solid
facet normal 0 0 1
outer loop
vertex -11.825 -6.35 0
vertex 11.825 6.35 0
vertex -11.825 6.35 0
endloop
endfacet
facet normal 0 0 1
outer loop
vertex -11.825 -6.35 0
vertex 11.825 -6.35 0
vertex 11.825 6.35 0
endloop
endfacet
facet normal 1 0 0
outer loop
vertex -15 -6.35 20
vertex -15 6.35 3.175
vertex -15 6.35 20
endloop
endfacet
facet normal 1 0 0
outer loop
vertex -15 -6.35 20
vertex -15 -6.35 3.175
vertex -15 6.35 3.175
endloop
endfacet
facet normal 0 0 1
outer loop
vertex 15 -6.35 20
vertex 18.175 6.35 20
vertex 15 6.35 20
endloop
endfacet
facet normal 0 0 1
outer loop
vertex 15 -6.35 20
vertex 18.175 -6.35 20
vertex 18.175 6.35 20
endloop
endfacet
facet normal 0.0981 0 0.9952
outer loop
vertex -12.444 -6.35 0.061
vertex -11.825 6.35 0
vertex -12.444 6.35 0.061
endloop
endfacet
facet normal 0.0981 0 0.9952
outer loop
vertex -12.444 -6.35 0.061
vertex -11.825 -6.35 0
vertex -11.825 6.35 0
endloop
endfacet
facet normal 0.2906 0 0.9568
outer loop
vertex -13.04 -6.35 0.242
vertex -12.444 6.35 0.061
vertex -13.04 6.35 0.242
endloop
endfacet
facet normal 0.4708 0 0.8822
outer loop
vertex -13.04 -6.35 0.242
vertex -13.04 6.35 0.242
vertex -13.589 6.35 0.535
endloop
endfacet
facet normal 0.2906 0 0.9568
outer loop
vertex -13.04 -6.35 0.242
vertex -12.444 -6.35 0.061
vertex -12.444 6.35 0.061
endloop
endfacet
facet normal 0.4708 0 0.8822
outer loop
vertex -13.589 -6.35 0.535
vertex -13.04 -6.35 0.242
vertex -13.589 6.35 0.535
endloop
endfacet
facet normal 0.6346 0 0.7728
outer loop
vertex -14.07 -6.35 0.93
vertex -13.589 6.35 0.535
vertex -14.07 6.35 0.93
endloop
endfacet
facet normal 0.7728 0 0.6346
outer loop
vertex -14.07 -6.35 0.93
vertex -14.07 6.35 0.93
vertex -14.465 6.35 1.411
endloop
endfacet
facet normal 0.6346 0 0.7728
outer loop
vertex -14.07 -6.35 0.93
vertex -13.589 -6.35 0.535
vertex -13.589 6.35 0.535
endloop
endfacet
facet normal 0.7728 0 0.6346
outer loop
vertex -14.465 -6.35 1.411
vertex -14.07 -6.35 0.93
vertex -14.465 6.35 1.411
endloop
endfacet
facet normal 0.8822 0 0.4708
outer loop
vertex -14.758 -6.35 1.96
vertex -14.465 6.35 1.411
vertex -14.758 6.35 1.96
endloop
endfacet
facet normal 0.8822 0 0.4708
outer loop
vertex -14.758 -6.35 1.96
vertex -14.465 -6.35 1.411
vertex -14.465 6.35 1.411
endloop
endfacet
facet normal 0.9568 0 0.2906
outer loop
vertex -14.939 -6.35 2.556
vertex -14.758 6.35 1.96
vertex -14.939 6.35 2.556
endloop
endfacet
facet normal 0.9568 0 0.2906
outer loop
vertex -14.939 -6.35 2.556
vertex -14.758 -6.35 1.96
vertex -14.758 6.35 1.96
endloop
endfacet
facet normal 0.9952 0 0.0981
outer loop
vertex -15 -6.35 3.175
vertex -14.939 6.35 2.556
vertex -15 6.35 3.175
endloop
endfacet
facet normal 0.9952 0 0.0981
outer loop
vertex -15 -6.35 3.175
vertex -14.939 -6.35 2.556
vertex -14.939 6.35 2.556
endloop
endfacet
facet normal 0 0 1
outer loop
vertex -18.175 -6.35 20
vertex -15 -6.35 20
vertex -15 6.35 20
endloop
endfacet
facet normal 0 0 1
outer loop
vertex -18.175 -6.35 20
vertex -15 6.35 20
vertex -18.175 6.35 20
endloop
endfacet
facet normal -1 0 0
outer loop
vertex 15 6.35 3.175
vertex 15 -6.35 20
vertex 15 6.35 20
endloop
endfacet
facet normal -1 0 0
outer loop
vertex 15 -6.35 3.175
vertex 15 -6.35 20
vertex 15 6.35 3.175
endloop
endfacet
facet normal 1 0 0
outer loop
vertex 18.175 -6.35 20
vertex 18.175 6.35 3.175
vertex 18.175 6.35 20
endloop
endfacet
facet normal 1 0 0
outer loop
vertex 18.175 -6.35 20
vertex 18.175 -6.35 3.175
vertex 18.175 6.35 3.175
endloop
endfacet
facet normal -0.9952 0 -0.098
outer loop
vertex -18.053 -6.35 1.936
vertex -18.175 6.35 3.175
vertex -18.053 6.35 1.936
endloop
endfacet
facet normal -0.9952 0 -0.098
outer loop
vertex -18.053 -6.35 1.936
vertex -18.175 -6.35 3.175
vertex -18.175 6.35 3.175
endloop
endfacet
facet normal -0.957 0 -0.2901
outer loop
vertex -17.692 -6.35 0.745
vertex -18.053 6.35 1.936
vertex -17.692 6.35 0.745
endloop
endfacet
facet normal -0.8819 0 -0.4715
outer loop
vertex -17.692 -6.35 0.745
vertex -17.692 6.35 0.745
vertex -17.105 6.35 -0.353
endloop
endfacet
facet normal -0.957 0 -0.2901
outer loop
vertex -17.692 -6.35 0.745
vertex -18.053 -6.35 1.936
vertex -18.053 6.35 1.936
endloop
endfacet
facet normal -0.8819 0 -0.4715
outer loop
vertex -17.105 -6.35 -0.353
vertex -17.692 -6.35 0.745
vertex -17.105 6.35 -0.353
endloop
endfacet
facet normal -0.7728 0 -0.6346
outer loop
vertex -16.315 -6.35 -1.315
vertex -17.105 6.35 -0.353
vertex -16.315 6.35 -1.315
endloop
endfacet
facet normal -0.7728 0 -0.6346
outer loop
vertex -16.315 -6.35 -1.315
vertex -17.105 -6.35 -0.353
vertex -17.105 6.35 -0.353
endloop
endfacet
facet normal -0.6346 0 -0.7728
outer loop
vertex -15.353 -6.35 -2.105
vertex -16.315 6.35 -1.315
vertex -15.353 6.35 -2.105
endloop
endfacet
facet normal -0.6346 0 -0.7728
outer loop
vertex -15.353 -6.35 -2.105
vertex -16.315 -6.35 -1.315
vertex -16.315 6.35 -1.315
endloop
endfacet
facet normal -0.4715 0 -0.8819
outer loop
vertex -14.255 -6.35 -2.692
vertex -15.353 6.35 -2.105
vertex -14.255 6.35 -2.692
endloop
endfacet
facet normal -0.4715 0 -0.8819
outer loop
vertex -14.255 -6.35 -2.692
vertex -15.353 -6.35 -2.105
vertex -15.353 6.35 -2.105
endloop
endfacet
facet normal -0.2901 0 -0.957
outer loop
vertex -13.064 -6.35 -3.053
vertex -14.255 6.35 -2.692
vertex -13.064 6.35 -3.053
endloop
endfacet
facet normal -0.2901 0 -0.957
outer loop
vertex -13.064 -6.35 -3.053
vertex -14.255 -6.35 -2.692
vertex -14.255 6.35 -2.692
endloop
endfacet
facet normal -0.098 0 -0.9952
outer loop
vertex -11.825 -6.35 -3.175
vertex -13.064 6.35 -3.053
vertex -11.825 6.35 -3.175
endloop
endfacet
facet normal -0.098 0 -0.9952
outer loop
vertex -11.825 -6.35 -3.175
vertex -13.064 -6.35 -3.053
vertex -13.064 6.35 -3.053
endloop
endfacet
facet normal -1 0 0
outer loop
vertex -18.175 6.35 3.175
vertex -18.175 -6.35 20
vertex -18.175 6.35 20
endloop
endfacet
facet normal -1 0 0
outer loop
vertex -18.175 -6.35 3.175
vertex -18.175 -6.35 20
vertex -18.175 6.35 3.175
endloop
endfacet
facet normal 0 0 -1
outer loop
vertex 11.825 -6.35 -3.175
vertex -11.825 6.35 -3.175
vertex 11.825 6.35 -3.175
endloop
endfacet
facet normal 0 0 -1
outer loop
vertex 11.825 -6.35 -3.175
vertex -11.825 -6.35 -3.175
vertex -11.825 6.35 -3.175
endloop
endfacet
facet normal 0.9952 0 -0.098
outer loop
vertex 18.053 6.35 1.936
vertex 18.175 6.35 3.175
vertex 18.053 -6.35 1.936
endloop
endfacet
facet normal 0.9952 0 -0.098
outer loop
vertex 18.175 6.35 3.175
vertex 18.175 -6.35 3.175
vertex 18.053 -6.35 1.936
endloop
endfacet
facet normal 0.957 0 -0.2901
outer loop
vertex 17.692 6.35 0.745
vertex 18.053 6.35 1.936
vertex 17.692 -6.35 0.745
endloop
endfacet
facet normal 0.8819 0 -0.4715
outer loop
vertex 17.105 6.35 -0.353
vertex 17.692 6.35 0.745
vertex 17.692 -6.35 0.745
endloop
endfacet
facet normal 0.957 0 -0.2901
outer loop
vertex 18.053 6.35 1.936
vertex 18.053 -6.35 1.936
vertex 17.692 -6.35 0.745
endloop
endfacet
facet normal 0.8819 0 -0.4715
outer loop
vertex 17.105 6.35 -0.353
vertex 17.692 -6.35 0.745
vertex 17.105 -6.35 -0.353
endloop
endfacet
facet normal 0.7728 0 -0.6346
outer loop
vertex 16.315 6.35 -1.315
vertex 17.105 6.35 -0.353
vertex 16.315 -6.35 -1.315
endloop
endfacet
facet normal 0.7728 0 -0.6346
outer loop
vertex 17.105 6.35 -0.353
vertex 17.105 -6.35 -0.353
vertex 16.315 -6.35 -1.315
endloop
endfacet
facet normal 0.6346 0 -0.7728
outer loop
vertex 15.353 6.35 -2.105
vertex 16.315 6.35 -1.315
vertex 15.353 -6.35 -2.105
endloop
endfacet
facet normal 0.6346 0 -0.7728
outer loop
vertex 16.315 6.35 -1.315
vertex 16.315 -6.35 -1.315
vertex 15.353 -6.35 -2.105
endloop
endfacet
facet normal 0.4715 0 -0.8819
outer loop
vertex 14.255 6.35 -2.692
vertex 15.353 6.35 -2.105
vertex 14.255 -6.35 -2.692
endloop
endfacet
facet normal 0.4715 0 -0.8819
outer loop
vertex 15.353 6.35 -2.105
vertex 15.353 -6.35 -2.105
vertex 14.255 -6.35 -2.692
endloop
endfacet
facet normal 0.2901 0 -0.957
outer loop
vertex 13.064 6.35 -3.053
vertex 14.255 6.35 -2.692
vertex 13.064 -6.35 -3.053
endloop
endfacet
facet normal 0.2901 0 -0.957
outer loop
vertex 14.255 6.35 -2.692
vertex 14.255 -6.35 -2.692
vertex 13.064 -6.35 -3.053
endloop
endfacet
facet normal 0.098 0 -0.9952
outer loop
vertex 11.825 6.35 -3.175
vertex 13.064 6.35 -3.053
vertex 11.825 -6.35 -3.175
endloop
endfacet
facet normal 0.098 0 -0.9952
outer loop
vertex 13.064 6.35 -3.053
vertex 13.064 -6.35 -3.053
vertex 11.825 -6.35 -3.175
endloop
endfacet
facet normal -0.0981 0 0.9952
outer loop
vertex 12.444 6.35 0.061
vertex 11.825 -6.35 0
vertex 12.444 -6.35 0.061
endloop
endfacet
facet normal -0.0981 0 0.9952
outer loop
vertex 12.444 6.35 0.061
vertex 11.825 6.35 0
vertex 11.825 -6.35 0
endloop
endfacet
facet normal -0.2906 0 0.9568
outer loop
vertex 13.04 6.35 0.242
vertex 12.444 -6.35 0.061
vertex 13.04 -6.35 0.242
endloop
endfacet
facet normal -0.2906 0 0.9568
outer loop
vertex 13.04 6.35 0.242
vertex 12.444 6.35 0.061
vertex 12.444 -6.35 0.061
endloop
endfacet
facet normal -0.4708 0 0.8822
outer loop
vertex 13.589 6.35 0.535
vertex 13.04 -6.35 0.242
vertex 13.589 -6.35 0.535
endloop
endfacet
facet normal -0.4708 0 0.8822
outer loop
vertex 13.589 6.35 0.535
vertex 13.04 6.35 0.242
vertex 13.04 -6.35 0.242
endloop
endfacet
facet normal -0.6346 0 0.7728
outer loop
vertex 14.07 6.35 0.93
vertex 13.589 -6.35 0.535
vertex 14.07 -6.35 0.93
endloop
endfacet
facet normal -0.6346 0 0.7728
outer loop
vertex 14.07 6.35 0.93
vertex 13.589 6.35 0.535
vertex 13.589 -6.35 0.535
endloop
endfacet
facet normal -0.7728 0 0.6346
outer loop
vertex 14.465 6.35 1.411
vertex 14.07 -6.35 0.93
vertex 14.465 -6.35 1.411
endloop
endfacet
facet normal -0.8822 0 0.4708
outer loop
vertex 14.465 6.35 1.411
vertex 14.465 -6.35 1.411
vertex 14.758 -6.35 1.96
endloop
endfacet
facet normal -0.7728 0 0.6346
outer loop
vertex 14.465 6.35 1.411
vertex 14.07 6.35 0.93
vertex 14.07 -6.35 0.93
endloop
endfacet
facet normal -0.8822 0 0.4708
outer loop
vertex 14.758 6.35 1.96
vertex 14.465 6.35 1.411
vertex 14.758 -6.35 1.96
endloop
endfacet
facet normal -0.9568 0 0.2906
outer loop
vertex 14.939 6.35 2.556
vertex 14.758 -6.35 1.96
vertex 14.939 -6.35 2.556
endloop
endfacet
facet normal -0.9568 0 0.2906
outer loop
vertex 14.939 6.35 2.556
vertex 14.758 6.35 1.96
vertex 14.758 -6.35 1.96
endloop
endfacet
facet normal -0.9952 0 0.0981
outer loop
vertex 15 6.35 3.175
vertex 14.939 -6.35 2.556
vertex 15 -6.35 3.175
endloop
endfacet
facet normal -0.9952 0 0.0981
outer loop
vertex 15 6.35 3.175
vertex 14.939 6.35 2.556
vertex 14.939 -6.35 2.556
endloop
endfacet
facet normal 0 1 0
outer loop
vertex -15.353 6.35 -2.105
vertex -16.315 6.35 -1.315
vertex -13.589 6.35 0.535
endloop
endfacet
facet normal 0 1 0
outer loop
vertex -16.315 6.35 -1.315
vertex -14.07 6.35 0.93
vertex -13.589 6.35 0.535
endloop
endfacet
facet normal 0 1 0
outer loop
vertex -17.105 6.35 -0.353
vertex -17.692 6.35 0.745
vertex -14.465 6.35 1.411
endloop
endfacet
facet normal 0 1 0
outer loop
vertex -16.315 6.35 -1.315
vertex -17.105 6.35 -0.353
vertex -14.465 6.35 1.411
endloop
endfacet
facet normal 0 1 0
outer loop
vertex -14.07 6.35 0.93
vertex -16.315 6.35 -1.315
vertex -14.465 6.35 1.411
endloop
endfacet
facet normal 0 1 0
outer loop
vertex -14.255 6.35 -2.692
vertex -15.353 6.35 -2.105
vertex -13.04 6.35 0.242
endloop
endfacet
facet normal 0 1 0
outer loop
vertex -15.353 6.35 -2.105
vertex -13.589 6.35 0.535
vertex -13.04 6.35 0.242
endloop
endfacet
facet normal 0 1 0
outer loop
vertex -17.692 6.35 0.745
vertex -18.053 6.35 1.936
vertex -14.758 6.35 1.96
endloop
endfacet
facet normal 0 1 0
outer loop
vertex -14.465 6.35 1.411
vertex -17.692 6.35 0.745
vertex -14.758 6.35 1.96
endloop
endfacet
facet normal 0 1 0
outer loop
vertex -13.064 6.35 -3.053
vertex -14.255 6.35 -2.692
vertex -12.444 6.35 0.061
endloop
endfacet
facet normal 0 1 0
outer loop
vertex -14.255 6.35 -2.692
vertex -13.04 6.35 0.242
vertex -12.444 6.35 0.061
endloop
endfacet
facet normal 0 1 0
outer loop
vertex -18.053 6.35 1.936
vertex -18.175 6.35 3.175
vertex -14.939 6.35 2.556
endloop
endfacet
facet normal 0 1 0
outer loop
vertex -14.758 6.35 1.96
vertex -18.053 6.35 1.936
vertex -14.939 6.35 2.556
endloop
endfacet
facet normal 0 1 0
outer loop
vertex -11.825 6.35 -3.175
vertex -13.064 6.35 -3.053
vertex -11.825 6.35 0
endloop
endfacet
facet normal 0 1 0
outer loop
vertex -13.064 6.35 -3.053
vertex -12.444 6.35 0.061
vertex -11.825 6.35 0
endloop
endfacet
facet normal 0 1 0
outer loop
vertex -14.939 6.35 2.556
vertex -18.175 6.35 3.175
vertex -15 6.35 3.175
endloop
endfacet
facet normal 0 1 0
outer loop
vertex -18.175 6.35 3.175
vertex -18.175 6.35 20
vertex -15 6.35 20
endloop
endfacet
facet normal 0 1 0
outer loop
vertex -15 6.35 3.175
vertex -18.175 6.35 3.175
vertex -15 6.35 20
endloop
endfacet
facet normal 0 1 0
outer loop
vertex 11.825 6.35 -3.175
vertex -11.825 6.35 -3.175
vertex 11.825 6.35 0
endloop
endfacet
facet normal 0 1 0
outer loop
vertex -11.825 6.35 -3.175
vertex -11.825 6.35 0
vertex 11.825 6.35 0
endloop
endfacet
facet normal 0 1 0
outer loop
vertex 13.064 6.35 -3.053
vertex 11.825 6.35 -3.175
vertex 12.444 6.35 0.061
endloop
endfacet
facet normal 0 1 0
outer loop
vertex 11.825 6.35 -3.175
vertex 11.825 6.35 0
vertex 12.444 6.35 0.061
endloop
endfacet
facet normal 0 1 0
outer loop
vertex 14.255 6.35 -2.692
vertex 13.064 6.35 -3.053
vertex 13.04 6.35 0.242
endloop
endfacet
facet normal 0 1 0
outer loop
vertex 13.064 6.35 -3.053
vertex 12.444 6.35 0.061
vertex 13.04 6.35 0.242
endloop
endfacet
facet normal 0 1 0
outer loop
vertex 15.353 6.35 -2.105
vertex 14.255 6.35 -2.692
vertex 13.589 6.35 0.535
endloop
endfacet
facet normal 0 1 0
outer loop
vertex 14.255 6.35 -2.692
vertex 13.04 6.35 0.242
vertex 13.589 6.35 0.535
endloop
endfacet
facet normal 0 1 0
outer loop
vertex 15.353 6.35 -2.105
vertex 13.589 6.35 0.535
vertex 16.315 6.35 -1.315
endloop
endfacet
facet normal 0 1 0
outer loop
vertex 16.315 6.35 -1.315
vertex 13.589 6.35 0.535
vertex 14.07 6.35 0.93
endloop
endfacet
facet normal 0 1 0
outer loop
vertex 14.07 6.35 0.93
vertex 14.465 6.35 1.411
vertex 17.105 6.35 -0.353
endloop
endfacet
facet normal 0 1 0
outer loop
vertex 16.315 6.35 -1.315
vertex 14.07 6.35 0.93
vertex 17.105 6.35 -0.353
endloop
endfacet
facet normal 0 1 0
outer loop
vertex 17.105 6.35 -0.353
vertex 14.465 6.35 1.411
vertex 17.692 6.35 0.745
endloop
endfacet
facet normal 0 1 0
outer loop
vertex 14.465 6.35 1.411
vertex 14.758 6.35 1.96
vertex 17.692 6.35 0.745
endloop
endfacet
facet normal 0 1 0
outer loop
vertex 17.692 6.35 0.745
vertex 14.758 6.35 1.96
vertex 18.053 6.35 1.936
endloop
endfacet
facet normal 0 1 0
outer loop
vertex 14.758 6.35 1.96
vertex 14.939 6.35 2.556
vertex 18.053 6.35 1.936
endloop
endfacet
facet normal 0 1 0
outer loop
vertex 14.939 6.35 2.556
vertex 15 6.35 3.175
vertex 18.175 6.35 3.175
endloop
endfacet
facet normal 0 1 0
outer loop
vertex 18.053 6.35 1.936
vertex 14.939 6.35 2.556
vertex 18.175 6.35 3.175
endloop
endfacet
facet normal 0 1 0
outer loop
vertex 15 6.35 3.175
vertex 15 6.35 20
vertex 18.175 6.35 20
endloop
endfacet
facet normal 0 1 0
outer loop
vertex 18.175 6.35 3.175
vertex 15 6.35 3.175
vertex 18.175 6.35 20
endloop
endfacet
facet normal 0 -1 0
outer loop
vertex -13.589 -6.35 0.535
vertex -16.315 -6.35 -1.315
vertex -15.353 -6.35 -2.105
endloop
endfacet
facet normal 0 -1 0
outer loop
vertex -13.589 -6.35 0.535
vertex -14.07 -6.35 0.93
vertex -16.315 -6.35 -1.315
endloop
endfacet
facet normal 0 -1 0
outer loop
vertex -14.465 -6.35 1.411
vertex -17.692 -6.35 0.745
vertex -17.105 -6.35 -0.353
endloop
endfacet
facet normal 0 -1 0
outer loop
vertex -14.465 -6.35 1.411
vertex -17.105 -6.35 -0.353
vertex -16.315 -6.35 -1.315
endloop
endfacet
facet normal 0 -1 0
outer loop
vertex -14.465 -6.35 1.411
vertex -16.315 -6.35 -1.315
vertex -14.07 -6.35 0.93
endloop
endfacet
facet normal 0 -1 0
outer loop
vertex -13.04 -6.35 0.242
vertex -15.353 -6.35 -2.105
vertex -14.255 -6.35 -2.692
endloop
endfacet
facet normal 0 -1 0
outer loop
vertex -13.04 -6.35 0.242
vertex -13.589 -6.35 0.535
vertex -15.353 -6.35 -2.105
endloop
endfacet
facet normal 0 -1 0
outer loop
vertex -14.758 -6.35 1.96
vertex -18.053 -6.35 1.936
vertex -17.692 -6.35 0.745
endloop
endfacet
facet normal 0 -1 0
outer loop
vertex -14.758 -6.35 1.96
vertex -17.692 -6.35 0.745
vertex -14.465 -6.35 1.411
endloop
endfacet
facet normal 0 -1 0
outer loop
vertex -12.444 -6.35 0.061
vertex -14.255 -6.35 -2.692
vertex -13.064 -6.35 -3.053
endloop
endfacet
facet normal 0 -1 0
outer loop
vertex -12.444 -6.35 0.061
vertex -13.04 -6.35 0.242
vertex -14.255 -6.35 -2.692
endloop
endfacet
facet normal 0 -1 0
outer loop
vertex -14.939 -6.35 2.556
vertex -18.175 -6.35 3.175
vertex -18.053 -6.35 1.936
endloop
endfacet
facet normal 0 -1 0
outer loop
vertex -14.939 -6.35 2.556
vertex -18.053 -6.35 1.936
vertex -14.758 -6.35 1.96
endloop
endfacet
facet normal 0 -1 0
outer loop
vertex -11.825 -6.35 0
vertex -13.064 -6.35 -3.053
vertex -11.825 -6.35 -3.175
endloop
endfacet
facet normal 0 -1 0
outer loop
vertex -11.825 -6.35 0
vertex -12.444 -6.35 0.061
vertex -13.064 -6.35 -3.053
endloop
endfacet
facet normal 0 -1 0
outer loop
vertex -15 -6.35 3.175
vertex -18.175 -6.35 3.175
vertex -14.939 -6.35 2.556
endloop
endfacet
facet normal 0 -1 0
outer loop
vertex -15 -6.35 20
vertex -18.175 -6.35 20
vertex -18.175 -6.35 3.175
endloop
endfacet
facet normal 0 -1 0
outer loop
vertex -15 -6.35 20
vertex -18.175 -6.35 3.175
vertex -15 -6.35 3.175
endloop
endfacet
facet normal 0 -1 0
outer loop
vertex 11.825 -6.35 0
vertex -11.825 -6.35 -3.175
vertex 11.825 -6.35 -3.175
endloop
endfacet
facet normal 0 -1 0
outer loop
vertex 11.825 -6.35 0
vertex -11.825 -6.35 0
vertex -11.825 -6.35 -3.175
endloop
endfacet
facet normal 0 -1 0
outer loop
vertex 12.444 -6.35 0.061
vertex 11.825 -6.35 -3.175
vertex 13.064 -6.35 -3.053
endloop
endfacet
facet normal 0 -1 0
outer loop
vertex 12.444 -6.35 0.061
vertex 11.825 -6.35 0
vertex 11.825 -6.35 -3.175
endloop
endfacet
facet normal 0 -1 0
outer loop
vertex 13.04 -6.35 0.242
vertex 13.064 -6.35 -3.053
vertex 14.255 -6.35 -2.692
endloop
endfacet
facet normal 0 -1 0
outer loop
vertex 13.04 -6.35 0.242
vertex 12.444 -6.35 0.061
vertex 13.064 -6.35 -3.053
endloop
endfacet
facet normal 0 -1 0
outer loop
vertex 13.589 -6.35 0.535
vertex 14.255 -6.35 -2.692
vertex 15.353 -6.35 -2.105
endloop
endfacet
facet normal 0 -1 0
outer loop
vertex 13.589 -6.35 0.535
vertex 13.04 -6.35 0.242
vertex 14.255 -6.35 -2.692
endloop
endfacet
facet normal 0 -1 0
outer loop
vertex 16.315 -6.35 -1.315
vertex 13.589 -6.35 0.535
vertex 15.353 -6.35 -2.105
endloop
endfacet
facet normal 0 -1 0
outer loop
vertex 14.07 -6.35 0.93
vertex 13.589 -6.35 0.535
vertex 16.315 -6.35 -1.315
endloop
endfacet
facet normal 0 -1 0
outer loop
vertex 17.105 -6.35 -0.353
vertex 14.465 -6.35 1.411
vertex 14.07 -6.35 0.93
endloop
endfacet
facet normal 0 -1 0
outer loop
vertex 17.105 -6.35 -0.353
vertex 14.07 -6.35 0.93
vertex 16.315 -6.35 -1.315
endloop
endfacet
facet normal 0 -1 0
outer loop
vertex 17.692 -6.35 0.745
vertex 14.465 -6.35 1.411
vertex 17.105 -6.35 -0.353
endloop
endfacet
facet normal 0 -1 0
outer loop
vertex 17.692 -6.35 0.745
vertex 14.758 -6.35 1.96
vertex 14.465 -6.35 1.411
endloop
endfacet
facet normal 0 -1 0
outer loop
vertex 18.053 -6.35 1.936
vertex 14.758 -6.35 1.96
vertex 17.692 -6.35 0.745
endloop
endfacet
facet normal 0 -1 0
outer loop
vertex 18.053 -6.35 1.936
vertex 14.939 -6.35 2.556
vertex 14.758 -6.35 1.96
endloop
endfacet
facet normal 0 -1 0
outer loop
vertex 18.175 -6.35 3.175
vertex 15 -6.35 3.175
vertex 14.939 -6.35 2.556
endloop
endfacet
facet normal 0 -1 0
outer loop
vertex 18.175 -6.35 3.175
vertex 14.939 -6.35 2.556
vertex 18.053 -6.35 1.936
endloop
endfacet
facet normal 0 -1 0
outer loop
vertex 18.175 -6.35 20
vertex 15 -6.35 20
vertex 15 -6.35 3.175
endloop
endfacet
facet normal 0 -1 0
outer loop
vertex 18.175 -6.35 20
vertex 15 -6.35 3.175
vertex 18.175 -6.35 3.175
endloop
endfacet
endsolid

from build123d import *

# Parameters (mm, degrees)
F1_DEPTH = 6.35
F2_R     = 3.175
F3_R     = 6.35


with BuildPart() as f1:
    # F0 (on Front) → F1 (new body, symmetric)
    with BuildSketch(Plane.XZ):
        Polygon((15, 0), (0, 0), (-15, 0), (-15, 20), (-18.175, 20), (-18.175, -3.175), (0, -3.175), (18.175, -3.175), (18.175, 20), (15, 20), align=None)
    extrude(amount=F1_DEPTH, both=True)

    # F2
    f2_edges = [f1.edges().sort_by_distance(p)[0] for p in [
        (15, 0, 0),
        (-15, 0, 0),
    ]]
    fillet(f2_edges, radius=F2_R)

    # F3
    f3_edges = [f1.edges().sort_by_distance(p)[0] for p in [
        (-18.175, 0, -3.175),
        (18.175, 0, -3.175),
    ]]
    fillet(f3_edges, radius=F3_R)


solid = f1.part
